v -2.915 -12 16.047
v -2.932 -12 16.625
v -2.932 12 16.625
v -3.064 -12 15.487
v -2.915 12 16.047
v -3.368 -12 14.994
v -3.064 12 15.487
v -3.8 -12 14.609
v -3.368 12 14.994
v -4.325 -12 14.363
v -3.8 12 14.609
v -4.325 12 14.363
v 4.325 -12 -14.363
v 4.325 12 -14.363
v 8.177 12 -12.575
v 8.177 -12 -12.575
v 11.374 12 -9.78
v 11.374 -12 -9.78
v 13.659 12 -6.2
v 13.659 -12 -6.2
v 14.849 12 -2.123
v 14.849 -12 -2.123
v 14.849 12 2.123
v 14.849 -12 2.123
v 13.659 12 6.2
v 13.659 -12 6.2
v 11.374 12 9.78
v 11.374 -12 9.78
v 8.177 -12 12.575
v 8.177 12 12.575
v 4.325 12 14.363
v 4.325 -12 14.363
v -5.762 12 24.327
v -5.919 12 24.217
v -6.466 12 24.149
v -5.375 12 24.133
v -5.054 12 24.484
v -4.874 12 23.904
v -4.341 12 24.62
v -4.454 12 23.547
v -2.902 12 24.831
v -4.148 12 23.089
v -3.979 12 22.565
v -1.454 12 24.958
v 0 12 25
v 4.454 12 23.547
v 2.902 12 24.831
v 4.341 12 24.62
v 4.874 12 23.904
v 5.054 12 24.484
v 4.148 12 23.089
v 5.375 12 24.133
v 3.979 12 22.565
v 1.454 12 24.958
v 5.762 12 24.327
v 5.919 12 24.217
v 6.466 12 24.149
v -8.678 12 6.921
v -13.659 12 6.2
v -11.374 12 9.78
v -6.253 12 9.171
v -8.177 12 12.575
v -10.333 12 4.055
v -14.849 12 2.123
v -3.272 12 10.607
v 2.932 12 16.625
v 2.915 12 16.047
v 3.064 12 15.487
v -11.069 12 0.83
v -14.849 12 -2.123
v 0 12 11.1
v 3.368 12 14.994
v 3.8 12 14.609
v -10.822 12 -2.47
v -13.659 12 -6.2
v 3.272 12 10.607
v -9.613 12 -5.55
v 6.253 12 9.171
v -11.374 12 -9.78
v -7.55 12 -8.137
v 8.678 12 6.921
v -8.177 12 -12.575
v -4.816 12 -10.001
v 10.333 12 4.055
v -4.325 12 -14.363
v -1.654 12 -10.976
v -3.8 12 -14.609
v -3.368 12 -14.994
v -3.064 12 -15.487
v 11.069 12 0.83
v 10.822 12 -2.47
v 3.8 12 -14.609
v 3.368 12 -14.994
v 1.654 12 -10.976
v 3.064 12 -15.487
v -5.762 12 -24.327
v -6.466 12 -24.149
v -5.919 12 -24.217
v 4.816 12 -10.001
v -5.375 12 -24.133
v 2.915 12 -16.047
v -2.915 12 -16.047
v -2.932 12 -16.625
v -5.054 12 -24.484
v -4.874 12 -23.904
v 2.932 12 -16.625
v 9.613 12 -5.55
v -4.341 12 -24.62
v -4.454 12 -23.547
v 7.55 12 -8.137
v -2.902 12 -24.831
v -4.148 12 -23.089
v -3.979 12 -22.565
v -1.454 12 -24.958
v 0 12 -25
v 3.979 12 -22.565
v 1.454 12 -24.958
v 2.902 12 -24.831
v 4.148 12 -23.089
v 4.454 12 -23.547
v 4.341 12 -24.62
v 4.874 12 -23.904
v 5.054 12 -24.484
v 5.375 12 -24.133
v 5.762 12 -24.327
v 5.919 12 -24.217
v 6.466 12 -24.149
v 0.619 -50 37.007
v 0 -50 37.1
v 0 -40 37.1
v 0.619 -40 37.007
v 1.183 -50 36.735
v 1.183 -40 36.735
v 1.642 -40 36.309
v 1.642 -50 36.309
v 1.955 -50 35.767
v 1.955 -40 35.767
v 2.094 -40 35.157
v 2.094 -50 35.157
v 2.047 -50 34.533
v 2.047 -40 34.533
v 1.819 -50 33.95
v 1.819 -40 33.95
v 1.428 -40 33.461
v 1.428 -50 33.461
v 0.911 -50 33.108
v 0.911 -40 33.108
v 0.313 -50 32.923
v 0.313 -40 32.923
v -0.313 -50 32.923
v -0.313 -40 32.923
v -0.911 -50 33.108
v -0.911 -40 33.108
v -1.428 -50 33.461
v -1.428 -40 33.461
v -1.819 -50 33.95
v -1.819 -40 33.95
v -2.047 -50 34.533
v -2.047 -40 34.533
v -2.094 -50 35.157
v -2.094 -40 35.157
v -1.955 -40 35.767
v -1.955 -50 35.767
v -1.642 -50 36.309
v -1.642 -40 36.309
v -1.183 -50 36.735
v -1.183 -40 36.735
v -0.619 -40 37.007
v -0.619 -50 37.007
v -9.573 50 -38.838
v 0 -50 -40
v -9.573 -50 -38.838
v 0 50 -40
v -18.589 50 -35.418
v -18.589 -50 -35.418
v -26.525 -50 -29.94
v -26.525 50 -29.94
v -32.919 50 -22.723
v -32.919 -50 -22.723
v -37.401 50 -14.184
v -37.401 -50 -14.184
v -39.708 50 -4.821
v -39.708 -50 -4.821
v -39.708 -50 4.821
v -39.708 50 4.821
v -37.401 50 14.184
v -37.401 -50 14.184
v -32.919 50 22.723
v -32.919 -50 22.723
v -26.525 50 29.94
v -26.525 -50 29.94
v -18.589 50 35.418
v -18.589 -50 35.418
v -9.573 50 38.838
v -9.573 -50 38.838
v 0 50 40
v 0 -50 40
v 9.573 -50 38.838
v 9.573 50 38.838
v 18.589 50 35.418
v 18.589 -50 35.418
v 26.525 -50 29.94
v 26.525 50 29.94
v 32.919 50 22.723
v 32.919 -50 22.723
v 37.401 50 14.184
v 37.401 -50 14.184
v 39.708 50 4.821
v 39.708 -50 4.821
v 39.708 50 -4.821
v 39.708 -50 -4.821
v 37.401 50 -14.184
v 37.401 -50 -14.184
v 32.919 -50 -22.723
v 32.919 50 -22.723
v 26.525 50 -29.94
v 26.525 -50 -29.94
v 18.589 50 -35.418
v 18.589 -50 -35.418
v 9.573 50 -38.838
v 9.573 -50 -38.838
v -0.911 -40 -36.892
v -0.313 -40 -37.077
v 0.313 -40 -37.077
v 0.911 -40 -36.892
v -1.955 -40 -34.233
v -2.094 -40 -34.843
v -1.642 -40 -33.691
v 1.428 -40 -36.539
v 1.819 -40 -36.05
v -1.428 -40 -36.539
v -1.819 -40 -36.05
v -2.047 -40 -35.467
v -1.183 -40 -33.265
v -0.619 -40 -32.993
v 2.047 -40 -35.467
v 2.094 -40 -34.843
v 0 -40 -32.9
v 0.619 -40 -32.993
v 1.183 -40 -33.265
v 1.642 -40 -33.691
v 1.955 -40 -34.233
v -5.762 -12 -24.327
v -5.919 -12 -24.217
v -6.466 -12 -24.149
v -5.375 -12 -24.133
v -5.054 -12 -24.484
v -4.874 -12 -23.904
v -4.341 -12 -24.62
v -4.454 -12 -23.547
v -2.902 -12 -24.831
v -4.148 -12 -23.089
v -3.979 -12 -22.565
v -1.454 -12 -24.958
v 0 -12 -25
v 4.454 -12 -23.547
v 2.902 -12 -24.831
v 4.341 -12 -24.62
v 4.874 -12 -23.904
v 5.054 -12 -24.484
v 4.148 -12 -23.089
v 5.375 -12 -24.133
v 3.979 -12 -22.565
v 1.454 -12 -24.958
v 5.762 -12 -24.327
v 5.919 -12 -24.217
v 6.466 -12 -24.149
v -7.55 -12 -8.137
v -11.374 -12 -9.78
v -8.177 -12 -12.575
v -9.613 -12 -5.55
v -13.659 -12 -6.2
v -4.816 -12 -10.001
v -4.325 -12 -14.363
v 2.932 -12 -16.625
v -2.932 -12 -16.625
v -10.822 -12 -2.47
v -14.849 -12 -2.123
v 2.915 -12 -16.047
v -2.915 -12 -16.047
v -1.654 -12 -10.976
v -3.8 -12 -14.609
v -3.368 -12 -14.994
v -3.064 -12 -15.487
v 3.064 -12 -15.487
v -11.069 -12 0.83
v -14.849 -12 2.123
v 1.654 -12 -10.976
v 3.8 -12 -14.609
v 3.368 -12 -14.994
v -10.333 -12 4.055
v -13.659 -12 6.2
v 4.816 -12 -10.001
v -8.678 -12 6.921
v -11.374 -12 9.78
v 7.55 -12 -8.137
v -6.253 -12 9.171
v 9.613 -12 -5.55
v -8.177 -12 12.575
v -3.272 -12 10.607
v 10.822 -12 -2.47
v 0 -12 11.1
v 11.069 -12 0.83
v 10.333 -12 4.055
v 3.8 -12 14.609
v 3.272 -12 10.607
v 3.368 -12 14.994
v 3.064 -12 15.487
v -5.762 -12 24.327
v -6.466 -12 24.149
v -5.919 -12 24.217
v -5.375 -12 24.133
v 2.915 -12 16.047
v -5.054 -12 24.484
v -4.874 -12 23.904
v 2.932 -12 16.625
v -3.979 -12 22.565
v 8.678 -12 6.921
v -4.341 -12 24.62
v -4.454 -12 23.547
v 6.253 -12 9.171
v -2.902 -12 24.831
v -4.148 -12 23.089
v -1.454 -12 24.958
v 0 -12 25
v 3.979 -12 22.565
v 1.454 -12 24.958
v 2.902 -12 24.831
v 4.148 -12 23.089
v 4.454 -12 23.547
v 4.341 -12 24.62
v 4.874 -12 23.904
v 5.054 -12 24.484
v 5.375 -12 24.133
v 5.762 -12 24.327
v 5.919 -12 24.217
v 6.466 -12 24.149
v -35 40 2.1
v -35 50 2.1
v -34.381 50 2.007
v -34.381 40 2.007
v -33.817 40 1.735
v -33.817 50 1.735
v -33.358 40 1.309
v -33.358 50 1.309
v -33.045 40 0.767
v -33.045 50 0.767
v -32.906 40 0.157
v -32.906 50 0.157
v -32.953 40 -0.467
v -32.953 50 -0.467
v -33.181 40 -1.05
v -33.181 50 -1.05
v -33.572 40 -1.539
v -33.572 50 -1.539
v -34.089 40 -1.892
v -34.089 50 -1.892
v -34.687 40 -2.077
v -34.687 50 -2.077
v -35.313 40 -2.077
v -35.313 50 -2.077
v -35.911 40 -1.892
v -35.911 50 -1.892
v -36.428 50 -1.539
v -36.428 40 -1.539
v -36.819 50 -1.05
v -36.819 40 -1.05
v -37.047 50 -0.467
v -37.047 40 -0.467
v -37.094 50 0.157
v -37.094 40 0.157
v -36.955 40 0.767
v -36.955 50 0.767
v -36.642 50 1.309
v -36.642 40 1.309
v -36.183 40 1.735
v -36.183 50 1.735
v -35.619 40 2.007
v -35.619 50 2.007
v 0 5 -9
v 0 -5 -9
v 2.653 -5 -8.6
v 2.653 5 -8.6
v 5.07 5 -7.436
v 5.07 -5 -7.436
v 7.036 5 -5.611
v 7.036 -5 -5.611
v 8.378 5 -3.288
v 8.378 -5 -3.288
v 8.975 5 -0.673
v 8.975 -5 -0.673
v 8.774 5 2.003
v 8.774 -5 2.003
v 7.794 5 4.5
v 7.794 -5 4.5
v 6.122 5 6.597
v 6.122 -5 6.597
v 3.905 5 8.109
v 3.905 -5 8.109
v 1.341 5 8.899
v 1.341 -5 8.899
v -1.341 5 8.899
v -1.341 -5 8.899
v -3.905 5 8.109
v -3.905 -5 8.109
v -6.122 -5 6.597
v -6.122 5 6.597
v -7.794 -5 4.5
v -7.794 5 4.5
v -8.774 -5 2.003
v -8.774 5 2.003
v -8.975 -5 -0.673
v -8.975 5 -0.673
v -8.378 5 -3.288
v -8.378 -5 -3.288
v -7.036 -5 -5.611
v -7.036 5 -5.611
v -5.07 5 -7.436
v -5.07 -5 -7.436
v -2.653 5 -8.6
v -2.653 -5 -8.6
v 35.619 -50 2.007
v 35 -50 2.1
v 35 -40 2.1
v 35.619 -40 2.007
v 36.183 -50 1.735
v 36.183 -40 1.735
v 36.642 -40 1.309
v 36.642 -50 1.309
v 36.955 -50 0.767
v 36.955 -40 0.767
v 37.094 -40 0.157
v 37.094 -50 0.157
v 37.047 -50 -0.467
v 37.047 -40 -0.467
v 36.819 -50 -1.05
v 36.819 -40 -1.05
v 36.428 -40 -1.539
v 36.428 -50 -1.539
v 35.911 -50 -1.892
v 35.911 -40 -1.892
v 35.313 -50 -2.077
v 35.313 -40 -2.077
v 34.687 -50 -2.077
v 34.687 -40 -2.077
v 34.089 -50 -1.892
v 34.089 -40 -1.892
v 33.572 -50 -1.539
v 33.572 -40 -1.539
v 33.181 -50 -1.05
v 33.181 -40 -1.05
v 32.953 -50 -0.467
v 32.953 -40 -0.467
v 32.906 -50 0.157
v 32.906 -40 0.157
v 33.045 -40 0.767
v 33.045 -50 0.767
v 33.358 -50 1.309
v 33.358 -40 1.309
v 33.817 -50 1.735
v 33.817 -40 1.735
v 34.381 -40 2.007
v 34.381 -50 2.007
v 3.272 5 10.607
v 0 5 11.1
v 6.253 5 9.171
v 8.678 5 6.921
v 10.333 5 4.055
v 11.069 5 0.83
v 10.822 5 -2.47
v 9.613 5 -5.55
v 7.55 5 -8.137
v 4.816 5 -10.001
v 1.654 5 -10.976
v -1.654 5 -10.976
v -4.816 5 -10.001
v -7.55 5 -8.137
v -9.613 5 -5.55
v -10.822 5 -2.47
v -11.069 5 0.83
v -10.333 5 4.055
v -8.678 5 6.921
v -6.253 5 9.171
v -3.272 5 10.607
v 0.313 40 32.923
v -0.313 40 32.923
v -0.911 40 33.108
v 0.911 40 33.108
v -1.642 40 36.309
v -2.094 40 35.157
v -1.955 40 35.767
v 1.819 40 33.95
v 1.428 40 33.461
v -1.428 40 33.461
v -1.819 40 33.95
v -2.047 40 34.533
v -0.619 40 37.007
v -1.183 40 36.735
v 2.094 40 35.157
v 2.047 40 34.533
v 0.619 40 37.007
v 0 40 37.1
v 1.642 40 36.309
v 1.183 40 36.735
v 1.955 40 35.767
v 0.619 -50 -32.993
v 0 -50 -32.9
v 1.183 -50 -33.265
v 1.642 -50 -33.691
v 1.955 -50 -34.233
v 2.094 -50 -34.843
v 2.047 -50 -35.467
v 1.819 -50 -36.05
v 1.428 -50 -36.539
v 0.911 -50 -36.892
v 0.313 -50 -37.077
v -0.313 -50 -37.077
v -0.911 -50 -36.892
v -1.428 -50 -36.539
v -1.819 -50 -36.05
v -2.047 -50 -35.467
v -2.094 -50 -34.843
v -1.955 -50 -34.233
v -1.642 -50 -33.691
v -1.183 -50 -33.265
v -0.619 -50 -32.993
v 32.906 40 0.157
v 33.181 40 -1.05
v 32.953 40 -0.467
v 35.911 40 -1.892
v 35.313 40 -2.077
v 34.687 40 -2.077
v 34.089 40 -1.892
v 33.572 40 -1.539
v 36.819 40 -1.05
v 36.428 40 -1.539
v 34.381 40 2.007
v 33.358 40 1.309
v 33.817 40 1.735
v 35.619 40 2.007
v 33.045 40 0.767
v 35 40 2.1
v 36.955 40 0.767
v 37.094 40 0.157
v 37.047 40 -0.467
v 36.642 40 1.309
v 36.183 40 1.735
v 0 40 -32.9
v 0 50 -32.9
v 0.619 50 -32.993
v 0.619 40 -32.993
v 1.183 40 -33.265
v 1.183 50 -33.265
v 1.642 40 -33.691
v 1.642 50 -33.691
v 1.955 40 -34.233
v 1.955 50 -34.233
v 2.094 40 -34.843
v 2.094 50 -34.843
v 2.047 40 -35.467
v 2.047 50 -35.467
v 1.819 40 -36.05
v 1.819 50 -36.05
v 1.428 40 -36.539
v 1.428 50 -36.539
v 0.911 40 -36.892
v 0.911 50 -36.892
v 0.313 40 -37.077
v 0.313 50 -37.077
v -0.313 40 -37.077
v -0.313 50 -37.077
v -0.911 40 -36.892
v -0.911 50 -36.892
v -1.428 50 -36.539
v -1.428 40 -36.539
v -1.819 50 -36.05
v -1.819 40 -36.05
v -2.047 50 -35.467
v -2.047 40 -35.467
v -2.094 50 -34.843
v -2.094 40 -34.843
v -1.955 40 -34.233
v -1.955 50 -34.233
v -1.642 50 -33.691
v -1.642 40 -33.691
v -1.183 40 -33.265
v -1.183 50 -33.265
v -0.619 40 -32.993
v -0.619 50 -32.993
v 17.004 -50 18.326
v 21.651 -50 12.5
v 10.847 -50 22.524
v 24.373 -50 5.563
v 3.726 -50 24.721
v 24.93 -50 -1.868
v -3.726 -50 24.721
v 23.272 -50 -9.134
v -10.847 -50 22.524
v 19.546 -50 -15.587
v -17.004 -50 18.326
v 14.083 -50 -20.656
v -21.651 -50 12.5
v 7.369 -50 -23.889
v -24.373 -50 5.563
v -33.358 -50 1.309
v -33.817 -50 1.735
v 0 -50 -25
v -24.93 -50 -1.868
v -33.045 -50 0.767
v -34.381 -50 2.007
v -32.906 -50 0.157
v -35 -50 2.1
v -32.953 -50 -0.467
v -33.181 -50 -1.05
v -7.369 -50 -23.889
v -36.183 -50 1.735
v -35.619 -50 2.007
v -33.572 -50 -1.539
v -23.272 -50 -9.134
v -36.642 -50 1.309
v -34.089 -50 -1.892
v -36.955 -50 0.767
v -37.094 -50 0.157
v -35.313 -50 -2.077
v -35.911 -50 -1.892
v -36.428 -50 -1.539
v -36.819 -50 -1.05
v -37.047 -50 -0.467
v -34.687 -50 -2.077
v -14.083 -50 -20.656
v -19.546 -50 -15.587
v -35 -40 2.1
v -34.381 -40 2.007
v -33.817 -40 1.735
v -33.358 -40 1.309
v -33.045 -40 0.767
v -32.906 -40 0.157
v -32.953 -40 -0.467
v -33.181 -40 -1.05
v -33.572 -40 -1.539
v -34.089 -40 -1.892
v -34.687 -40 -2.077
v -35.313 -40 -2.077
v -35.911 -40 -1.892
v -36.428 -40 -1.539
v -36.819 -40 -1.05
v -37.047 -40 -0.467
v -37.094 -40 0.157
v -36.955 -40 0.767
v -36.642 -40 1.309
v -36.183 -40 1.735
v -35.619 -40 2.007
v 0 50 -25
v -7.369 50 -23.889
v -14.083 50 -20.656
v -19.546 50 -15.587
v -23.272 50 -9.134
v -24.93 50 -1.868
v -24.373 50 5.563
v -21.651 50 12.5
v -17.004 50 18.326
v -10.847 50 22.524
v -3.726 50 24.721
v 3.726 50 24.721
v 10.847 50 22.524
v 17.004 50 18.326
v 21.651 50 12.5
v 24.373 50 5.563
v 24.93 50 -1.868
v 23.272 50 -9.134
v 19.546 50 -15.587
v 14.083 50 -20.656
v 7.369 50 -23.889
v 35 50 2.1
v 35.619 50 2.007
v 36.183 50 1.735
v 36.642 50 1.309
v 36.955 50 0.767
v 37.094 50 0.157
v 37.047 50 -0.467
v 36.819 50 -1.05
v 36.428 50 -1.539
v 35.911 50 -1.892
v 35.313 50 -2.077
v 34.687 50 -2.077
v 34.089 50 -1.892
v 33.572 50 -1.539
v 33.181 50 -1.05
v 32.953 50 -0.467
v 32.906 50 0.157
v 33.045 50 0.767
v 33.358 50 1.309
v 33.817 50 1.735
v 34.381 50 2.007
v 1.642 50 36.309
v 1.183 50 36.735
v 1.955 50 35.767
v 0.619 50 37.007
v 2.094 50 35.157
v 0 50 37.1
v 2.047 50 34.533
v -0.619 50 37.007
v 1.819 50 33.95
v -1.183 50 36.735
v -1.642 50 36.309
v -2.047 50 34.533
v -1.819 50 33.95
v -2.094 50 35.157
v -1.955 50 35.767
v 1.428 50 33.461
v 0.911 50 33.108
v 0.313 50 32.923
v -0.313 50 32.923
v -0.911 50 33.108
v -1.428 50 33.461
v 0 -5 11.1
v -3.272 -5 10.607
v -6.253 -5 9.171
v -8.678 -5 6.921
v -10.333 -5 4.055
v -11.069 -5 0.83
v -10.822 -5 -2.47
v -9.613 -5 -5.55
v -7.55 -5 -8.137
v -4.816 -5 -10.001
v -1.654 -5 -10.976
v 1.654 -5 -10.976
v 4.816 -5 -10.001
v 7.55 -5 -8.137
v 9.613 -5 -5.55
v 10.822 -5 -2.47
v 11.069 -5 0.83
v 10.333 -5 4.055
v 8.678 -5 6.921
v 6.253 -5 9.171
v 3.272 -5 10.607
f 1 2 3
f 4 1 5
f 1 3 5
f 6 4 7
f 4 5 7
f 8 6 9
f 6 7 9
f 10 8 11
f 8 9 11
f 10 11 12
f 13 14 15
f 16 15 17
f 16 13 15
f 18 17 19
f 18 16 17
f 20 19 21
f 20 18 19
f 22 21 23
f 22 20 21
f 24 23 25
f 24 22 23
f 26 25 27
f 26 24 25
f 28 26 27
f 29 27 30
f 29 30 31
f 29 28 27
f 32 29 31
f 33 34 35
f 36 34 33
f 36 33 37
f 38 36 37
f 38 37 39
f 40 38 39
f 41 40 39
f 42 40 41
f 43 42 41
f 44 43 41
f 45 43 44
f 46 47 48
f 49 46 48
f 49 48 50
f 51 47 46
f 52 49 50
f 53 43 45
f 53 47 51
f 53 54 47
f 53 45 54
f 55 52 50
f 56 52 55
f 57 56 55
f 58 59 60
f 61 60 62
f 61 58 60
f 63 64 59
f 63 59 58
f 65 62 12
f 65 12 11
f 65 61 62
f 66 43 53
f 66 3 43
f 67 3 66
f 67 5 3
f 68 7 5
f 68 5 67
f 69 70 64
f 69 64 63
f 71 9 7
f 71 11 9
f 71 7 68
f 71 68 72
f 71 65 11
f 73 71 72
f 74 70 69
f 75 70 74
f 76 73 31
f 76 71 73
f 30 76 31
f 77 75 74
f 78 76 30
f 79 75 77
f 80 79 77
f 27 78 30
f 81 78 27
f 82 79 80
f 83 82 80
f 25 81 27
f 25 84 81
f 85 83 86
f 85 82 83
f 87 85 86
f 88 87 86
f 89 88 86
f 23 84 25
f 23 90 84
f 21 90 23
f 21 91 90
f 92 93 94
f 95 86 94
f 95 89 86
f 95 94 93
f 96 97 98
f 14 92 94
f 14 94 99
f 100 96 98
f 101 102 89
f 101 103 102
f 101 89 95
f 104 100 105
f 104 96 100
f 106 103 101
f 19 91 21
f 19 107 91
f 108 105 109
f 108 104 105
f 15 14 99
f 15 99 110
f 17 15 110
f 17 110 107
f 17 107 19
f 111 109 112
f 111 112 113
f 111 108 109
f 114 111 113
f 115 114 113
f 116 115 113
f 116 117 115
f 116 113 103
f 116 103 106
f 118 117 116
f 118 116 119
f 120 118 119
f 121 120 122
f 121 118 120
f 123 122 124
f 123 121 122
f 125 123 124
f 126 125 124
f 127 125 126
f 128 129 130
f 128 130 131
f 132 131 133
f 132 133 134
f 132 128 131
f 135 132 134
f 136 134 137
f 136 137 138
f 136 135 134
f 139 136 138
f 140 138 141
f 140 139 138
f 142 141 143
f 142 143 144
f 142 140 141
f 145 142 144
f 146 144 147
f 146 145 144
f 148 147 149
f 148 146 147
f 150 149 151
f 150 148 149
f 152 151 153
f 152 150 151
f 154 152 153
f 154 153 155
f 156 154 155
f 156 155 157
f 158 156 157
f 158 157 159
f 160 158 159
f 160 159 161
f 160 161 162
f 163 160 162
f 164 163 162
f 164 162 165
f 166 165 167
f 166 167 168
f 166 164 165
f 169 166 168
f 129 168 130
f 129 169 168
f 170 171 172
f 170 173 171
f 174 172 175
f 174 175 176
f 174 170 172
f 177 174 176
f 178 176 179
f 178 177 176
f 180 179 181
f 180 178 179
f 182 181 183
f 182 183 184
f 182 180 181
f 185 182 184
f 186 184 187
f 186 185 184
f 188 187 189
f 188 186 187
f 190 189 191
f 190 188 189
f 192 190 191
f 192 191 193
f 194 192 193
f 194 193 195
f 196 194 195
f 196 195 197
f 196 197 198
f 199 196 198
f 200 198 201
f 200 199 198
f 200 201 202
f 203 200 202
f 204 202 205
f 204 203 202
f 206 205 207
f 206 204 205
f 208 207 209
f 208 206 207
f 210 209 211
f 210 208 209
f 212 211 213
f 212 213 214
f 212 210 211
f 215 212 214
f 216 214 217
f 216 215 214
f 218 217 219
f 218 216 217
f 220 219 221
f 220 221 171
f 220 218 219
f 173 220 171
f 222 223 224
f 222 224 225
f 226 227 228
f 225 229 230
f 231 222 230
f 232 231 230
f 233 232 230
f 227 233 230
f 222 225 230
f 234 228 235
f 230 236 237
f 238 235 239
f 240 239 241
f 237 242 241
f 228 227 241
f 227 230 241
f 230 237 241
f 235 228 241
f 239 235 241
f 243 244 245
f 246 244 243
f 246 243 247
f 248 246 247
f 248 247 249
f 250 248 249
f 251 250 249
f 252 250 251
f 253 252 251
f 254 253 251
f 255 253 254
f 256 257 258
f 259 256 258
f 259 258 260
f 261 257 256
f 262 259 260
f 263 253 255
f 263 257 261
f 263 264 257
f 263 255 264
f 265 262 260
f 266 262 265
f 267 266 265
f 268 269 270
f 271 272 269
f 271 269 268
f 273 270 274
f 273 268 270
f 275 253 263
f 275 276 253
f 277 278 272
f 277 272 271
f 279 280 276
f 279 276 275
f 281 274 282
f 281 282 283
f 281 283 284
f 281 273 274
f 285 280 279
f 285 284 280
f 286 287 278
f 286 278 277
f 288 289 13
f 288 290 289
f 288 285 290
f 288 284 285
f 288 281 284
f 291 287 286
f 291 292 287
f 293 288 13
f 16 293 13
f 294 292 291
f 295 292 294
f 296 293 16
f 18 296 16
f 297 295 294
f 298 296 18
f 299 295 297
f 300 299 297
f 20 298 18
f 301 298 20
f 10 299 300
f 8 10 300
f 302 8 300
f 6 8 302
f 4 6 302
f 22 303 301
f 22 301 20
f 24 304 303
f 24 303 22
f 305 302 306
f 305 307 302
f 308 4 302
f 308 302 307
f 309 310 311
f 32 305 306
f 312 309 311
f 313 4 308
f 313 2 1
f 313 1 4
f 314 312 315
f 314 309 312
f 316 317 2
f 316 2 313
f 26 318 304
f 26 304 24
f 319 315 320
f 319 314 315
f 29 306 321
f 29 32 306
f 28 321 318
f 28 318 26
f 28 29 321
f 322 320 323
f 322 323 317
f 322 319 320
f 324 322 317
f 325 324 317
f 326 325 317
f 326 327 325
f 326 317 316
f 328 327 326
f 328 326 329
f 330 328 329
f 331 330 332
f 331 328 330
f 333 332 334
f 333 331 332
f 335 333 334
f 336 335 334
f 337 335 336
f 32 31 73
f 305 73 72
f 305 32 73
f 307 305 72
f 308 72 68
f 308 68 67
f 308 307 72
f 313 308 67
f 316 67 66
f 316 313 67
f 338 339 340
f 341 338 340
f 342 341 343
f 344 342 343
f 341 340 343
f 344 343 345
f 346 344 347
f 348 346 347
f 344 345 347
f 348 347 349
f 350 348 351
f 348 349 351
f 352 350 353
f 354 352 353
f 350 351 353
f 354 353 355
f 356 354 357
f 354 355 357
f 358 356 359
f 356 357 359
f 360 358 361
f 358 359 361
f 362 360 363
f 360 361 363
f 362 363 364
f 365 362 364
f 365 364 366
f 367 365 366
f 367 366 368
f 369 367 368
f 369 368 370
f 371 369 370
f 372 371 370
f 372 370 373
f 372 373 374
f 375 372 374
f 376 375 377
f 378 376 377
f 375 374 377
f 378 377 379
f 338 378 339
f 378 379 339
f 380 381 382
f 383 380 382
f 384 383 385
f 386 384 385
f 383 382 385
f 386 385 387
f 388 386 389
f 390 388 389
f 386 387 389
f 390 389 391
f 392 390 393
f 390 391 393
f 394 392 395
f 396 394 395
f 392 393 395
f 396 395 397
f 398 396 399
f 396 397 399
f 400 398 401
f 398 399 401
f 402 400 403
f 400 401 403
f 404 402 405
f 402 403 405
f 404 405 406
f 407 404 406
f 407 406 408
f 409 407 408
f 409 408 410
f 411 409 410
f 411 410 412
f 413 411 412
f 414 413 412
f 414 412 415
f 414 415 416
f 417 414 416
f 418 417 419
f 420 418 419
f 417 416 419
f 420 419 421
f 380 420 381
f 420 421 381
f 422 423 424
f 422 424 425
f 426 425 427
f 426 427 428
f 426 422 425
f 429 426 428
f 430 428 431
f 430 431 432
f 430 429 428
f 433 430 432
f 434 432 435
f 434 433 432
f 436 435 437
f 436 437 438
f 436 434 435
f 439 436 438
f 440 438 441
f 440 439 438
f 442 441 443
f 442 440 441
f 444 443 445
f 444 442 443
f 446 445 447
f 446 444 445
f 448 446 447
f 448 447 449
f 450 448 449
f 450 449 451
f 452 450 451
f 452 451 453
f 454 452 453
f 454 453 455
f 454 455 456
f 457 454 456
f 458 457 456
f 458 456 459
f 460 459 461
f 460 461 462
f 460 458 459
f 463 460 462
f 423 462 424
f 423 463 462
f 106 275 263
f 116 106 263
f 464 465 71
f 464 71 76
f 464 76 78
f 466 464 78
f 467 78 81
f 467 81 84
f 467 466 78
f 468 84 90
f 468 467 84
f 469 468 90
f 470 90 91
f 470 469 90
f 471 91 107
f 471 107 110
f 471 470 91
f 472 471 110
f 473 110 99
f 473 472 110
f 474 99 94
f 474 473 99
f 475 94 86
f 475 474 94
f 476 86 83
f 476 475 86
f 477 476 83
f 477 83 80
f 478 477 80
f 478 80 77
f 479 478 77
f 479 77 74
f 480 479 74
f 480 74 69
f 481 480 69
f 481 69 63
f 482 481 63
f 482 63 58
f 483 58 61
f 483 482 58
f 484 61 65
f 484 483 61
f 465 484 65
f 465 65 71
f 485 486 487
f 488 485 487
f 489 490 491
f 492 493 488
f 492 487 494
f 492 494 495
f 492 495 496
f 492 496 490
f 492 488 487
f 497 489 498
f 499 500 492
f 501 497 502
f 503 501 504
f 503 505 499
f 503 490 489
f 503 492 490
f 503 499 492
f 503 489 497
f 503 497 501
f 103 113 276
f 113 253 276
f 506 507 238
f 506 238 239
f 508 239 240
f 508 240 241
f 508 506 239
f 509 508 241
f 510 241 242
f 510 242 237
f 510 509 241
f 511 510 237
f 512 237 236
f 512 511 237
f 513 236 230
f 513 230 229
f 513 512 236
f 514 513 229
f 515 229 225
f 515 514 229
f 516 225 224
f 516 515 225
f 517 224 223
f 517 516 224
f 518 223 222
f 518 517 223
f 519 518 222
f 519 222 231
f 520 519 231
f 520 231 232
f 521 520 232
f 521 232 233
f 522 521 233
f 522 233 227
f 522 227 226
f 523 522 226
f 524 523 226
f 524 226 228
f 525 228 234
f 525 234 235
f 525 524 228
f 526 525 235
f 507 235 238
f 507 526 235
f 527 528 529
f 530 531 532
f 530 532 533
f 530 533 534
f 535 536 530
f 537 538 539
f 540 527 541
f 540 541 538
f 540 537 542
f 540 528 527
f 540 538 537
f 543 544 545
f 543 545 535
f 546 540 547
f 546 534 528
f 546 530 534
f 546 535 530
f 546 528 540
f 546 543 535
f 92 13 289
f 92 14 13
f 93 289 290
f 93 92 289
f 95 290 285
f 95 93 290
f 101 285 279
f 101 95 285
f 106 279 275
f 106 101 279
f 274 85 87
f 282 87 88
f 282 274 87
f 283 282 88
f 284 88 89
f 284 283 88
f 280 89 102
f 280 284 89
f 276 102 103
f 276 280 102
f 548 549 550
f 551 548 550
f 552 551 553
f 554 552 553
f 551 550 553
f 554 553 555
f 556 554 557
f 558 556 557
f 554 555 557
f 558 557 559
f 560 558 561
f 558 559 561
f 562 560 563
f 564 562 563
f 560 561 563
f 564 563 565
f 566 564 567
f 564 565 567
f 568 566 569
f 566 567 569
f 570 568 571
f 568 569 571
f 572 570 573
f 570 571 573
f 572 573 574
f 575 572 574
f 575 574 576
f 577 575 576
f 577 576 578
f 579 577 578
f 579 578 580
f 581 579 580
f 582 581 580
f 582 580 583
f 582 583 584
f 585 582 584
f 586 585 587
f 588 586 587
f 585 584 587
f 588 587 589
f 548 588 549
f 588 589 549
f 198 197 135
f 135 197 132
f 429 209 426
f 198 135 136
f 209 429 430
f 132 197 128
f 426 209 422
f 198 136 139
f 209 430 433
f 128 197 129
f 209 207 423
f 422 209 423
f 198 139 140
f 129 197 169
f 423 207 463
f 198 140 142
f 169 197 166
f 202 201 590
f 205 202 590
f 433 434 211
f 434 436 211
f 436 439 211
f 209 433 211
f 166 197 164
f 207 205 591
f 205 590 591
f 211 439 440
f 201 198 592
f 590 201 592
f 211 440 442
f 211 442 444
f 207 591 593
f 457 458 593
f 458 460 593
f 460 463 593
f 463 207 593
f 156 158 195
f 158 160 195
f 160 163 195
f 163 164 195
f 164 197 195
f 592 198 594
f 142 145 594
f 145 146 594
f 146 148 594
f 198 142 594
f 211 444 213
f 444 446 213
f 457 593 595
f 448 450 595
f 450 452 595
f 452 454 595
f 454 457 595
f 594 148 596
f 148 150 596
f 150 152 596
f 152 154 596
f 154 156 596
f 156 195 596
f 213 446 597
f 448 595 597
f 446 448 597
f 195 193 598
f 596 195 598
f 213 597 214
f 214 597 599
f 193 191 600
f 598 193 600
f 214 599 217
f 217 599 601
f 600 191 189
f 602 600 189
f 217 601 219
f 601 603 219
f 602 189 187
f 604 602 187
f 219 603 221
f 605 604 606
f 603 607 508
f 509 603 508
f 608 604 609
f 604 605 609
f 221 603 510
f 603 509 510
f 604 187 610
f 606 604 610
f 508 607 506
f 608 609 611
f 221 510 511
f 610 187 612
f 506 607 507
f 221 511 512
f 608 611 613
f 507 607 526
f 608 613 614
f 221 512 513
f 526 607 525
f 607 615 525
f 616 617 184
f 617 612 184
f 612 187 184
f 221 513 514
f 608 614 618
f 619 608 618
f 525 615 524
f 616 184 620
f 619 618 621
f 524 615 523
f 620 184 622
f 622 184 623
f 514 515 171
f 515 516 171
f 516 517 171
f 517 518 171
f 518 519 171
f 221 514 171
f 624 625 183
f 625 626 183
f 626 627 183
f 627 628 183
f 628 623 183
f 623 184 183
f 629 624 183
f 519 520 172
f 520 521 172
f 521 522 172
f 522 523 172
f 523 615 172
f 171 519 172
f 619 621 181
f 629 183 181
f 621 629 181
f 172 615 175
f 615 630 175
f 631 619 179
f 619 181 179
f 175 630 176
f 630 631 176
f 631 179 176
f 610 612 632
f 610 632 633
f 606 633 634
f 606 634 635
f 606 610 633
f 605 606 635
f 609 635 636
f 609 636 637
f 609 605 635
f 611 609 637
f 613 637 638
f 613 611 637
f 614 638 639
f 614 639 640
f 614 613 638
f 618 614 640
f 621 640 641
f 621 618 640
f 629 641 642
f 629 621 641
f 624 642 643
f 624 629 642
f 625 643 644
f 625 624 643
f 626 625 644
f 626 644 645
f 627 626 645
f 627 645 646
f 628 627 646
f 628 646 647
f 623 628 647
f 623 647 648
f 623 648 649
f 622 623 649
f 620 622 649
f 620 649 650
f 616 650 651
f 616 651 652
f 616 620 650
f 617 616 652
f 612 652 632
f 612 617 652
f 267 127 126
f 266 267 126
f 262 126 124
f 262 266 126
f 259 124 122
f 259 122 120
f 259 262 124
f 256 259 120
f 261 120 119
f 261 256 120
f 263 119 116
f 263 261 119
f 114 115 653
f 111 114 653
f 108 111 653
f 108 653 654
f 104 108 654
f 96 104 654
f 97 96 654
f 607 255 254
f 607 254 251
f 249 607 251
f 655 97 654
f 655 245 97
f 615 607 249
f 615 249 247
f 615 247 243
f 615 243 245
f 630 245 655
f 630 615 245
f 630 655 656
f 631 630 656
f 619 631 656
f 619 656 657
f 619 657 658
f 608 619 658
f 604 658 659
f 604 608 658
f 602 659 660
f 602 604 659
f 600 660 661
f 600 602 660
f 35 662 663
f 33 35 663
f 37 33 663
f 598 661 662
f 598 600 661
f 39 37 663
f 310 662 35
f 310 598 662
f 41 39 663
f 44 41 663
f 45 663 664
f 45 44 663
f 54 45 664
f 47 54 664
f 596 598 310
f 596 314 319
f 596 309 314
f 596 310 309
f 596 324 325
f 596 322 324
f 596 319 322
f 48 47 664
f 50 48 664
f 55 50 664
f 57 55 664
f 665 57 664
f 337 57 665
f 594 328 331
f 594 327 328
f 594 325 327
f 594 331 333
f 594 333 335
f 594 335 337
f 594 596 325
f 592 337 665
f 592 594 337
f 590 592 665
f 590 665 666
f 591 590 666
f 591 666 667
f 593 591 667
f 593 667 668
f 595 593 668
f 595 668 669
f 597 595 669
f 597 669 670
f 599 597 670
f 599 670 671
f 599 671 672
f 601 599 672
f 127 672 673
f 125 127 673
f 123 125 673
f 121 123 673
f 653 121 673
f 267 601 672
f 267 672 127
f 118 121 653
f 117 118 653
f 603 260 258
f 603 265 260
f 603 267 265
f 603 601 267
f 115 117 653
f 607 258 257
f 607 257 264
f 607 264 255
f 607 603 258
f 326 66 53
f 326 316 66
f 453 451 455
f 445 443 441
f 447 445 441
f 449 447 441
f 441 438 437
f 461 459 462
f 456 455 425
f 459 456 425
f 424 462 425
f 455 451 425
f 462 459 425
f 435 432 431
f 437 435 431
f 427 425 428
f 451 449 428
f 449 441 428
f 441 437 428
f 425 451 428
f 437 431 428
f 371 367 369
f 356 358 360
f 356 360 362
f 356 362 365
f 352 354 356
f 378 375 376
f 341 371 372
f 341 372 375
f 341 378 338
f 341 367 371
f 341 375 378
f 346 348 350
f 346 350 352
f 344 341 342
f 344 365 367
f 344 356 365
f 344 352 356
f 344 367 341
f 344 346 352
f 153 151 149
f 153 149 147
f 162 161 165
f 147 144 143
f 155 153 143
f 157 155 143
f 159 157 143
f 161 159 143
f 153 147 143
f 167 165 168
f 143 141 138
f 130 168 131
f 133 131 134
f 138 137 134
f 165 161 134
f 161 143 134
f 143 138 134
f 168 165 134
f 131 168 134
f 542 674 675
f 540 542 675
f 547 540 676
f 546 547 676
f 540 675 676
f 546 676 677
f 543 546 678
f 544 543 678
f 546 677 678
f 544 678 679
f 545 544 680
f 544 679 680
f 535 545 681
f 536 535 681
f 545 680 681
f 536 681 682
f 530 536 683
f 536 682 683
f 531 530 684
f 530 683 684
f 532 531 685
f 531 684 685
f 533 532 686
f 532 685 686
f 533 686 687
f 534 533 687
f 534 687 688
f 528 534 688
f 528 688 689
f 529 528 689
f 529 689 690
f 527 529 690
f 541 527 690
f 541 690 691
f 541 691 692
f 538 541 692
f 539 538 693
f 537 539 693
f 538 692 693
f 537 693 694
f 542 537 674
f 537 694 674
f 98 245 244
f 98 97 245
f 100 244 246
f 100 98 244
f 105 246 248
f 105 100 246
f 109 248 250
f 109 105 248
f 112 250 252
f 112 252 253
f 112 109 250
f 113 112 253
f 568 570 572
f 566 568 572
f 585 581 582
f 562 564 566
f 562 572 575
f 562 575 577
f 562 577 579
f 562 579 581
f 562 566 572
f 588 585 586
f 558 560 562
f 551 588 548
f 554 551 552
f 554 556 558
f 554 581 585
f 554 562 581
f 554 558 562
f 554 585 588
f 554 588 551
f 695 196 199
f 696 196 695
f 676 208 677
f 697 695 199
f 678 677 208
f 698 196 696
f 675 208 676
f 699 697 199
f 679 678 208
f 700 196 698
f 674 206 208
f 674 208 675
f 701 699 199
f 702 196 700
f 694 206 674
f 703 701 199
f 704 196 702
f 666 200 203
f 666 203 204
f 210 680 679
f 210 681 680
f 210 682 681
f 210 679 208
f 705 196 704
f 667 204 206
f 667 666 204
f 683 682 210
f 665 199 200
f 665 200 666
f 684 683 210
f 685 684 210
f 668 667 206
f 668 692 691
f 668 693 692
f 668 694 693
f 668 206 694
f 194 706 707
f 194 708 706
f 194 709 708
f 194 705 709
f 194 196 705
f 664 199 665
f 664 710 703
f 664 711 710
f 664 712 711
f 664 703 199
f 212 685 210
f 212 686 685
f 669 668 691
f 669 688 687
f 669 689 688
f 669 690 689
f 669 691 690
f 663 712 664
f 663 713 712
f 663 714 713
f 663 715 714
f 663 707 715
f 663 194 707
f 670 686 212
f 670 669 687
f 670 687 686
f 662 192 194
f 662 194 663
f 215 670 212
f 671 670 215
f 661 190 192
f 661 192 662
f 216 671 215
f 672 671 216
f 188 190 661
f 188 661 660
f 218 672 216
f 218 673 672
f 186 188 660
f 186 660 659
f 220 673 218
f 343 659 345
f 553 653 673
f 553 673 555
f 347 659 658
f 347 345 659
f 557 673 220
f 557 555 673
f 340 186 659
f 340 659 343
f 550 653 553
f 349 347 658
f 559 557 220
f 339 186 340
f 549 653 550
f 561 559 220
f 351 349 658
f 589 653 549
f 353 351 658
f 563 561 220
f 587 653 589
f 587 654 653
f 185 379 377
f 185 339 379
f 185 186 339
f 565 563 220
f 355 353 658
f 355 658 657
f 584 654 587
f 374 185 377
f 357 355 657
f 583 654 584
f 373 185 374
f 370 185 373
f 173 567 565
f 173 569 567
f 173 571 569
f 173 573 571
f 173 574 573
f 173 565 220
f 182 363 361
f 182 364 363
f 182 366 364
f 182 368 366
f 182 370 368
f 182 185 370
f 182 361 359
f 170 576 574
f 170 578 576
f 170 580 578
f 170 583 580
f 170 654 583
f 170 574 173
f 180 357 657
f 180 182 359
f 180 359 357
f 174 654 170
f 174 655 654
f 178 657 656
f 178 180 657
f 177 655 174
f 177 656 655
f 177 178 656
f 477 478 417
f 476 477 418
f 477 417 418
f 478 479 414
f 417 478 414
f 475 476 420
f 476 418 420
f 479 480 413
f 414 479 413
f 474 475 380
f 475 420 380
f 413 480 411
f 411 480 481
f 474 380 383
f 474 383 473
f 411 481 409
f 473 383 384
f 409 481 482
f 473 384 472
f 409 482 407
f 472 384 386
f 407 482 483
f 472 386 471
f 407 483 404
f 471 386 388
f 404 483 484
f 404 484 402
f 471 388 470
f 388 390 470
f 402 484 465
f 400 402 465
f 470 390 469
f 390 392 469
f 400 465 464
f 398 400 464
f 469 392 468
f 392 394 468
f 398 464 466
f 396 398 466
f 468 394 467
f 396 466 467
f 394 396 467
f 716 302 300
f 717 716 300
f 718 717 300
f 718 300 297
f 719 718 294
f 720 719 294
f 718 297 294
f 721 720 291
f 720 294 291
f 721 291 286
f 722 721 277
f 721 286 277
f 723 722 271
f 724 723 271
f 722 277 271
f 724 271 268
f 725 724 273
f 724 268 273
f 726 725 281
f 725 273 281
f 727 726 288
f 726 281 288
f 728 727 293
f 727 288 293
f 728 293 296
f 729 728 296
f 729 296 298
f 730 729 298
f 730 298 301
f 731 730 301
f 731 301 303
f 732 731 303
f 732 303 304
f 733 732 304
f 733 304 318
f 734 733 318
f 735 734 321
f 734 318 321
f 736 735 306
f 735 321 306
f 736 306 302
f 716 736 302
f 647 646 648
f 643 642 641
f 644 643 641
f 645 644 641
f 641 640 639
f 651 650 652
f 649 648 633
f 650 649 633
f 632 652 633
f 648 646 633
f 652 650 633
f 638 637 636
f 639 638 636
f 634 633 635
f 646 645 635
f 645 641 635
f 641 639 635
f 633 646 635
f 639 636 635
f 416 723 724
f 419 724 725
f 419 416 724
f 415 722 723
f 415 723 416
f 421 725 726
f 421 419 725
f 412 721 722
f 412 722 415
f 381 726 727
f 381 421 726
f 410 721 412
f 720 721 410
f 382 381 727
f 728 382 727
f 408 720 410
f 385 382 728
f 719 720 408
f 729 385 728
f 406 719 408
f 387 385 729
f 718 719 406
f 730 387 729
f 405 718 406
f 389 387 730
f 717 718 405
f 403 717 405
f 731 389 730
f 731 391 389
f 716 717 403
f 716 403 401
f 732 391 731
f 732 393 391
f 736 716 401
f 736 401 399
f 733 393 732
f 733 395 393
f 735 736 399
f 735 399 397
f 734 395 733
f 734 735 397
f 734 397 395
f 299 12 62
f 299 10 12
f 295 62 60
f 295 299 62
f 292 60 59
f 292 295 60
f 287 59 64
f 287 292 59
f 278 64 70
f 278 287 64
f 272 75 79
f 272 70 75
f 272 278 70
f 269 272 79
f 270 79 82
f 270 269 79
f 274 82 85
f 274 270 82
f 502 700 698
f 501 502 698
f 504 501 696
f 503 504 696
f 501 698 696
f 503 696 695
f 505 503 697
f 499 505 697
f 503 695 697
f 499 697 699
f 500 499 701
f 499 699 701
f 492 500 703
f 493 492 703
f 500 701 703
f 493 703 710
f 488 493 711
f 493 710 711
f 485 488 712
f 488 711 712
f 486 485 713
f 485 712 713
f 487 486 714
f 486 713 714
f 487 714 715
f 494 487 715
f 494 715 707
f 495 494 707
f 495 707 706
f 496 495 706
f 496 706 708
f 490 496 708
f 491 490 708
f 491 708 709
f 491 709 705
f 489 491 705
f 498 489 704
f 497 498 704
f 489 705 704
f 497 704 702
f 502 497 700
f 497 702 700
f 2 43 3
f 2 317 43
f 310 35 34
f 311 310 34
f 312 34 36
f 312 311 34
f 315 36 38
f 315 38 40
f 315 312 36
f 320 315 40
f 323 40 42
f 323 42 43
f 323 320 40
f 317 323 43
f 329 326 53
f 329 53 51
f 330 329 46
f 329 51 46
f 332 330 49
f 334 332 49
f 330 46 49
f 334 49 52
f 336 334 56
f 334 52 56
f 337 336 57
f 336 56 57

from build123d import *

# Parameters (mm, degrees)
SKETCH1_R           = 40
SKETCH1_R_2         = 25
BOSS_EXTRUDE1_DEPTH = 50
SKETCH2_R           = 2.1
CUT_EXTRUDE1_DEPTH  = 10
BOSS_EXTRUDE2_START = -50
BOSS_EXTRUDE2_DEPTH = 12
BOSS_EXTRUDE3_START = -7
SKETCH4_R           = 15
SKETCH4_R_2         = 11.1
BOSS_EXTRUDE3_DEPTH = 7
BOSS_EXTRUDE4_START = 10
SKETCH5_R           = 15
SKETCH5_R_2         = 9
BOSS_EXTRUDE4_DEPTH = 10
BOSS_EXTRUDE5_START = 7
SKETCH6_R           = 15
SKETCH6_R_2         = 11.1
BOSS_EXTRUDE5_DEPTH = 7
FILLET1_R           = 2


with BuildPart() as part:
    # Sketch1 → Boss-Extrude1 (new, symmetric)
    with BuildSketch(Plane(origin=(0, 0, 0), x_dir=(1, 0, 0), z_dir=(0, 1, 0))):
        with Locations(Location((0, 0, 0), (0, 0, 90))):
            Circle(SKETCH1_R)
        with Locations(Location((0, 0, 0), (0, 0, 90))):
            Circle(SKETCH1_R_2, mode=Mode.SUBTRACT)
    extrude(amount=BOSS_EXTRUDE1_DEPTH, both=True)

    # Sketch2 → Cut-Extrude1 (cut)
    with BuildSketch(Plane(origin=(0, 50, 0), x_dir=(1, 0, 0), z_dir=(0, 1, 0))):
        with Locations(Location((0, 35, 0), (0, 0, 270))):
            Circle(SKETCH2_R)
        with Locations(Location((35, 0, 0), (0, 0, 270))):
            Circle(SKETCH2_R)
        with Locations(Location((0, -35, 0), (0, 0, 270))):
            Circle(SKETCH2_R)
        with Locations(Location((-35, 0, 0), (0, 0, 270))):
            Circle(SKETCH2_R)
    cut_extrude1 = extrude(amount=-CUT_EXTRUDE1_DEPTH, mode=Mode.SUBTRACT)

    # Mirror1: Cut-Extrude1 across plane
    add(cut_extrude1.mirror(Plane.ZX), mode=Mode.SUBTRACT)

    # Sketch3 → Boss-Extrude2 (add, symmetric)
    with BuildSketch(Plane.XZ.offset(50).offset(BOSS_EXTRUDE2_START)):
        with BuildLine():
            ThreePointArc((-2.604722665, 14.772116295), (-1.307336141, 14.942920471), (0, 15))
            Line((0, 15), (0, 25))
            ThreePointArc((0, 25), (-2.178893569, 24.904867452), (-4.341204442, 24.620193825))
            Line((-4.341204442, 24.620193825), (-2.604722665, 14.772116295))
        make_face()
        with BuildLine():
            Line((0, 25), (0, 15))
            ThreePointArc((0, 15), (1.307336141, 14.942920471), (2.604722665, 14.772116295))
            Line((2.604722665, 14.772116295), (4.341204442, 24.620193825))
            ThreePointArc((4.341204442, 24.620193825), (2.178893569, 24.904867452), (0, 25))
        make_face()
    boss_extrude2 = extrude(amount=BOSS_EXTRUDE2_DEPTH, both=True)

    # Mirror2: Boss-Extrude2 across plane
    add(boss_extrude2.mirror(Plane.XY))

    # Sketch4 → Boss-Extrude3 (add)
    with BuildSketch(Plane(origin=(0, 12, 0), x_dir=(1, 0, 0), z_dir=(0, 1, 0)).offset(BOSS_EXTRUDE3_START)):
        Circle(SKETCH4_R)
        with Locations(Location((0, 0, 0), (0, 0, 270))):
            Circle(SKETCH4_R_2, mode=Mode.SUBTRACT)
    extrude(amount=BOSS_EXTRUDE3_DEPTH)

    # Sketch5 → Boss-Extrude4 (add)
    with BuildSketch(Plane.XZ.offset(-5).offset(BOSS_EXTRUDE4_START)):
        Circle(SKETCH5_R)
        with Locations(Location((0, 0, 0), (0, 0, 270))):
            Circle(SKETCH5_R_2, mode=Mode.SUBTRACT)
    extrude(amount=-BOSS_EXTRUDE4_DEPTH)

    # Sketch6 → Boss-Extrude5 (add)
    with BuildSketch(Plane.XZ.offset(5).offset(BOSS_EXTRUDE5_START)):
        Circle(SKETCH6_R)
        with Locations(Location((0, 0, 0), (0, 0, 90))):
            Circle(SKETCH6_R_2, mode=Mode.SUBTRACT)
    extrude(amount=-BOSS_EXTRUDE5_DEPTH)

    # Fillet1
    fillet1_edges = [part.edges().sort_by_distance(p)[0] for p in [
        (2.604722665, 0, 14.772116295),
        (-2.604722665, 0, 14.772116295),
        (-4.341204442, 0, 24.620193825),
        (4.341204442, 0, 24.620193825),
        (-2.604722665, 0, -14.772116295),
        (2.604722665, 0, -14.772116295),
        (4.341204442, 0, -24.620193825),
        (-4.341204442, 0, -24.620193825),
    ]]
    fillet(fillet1_edges, radius=FILLET1_R)


solid = part.part
